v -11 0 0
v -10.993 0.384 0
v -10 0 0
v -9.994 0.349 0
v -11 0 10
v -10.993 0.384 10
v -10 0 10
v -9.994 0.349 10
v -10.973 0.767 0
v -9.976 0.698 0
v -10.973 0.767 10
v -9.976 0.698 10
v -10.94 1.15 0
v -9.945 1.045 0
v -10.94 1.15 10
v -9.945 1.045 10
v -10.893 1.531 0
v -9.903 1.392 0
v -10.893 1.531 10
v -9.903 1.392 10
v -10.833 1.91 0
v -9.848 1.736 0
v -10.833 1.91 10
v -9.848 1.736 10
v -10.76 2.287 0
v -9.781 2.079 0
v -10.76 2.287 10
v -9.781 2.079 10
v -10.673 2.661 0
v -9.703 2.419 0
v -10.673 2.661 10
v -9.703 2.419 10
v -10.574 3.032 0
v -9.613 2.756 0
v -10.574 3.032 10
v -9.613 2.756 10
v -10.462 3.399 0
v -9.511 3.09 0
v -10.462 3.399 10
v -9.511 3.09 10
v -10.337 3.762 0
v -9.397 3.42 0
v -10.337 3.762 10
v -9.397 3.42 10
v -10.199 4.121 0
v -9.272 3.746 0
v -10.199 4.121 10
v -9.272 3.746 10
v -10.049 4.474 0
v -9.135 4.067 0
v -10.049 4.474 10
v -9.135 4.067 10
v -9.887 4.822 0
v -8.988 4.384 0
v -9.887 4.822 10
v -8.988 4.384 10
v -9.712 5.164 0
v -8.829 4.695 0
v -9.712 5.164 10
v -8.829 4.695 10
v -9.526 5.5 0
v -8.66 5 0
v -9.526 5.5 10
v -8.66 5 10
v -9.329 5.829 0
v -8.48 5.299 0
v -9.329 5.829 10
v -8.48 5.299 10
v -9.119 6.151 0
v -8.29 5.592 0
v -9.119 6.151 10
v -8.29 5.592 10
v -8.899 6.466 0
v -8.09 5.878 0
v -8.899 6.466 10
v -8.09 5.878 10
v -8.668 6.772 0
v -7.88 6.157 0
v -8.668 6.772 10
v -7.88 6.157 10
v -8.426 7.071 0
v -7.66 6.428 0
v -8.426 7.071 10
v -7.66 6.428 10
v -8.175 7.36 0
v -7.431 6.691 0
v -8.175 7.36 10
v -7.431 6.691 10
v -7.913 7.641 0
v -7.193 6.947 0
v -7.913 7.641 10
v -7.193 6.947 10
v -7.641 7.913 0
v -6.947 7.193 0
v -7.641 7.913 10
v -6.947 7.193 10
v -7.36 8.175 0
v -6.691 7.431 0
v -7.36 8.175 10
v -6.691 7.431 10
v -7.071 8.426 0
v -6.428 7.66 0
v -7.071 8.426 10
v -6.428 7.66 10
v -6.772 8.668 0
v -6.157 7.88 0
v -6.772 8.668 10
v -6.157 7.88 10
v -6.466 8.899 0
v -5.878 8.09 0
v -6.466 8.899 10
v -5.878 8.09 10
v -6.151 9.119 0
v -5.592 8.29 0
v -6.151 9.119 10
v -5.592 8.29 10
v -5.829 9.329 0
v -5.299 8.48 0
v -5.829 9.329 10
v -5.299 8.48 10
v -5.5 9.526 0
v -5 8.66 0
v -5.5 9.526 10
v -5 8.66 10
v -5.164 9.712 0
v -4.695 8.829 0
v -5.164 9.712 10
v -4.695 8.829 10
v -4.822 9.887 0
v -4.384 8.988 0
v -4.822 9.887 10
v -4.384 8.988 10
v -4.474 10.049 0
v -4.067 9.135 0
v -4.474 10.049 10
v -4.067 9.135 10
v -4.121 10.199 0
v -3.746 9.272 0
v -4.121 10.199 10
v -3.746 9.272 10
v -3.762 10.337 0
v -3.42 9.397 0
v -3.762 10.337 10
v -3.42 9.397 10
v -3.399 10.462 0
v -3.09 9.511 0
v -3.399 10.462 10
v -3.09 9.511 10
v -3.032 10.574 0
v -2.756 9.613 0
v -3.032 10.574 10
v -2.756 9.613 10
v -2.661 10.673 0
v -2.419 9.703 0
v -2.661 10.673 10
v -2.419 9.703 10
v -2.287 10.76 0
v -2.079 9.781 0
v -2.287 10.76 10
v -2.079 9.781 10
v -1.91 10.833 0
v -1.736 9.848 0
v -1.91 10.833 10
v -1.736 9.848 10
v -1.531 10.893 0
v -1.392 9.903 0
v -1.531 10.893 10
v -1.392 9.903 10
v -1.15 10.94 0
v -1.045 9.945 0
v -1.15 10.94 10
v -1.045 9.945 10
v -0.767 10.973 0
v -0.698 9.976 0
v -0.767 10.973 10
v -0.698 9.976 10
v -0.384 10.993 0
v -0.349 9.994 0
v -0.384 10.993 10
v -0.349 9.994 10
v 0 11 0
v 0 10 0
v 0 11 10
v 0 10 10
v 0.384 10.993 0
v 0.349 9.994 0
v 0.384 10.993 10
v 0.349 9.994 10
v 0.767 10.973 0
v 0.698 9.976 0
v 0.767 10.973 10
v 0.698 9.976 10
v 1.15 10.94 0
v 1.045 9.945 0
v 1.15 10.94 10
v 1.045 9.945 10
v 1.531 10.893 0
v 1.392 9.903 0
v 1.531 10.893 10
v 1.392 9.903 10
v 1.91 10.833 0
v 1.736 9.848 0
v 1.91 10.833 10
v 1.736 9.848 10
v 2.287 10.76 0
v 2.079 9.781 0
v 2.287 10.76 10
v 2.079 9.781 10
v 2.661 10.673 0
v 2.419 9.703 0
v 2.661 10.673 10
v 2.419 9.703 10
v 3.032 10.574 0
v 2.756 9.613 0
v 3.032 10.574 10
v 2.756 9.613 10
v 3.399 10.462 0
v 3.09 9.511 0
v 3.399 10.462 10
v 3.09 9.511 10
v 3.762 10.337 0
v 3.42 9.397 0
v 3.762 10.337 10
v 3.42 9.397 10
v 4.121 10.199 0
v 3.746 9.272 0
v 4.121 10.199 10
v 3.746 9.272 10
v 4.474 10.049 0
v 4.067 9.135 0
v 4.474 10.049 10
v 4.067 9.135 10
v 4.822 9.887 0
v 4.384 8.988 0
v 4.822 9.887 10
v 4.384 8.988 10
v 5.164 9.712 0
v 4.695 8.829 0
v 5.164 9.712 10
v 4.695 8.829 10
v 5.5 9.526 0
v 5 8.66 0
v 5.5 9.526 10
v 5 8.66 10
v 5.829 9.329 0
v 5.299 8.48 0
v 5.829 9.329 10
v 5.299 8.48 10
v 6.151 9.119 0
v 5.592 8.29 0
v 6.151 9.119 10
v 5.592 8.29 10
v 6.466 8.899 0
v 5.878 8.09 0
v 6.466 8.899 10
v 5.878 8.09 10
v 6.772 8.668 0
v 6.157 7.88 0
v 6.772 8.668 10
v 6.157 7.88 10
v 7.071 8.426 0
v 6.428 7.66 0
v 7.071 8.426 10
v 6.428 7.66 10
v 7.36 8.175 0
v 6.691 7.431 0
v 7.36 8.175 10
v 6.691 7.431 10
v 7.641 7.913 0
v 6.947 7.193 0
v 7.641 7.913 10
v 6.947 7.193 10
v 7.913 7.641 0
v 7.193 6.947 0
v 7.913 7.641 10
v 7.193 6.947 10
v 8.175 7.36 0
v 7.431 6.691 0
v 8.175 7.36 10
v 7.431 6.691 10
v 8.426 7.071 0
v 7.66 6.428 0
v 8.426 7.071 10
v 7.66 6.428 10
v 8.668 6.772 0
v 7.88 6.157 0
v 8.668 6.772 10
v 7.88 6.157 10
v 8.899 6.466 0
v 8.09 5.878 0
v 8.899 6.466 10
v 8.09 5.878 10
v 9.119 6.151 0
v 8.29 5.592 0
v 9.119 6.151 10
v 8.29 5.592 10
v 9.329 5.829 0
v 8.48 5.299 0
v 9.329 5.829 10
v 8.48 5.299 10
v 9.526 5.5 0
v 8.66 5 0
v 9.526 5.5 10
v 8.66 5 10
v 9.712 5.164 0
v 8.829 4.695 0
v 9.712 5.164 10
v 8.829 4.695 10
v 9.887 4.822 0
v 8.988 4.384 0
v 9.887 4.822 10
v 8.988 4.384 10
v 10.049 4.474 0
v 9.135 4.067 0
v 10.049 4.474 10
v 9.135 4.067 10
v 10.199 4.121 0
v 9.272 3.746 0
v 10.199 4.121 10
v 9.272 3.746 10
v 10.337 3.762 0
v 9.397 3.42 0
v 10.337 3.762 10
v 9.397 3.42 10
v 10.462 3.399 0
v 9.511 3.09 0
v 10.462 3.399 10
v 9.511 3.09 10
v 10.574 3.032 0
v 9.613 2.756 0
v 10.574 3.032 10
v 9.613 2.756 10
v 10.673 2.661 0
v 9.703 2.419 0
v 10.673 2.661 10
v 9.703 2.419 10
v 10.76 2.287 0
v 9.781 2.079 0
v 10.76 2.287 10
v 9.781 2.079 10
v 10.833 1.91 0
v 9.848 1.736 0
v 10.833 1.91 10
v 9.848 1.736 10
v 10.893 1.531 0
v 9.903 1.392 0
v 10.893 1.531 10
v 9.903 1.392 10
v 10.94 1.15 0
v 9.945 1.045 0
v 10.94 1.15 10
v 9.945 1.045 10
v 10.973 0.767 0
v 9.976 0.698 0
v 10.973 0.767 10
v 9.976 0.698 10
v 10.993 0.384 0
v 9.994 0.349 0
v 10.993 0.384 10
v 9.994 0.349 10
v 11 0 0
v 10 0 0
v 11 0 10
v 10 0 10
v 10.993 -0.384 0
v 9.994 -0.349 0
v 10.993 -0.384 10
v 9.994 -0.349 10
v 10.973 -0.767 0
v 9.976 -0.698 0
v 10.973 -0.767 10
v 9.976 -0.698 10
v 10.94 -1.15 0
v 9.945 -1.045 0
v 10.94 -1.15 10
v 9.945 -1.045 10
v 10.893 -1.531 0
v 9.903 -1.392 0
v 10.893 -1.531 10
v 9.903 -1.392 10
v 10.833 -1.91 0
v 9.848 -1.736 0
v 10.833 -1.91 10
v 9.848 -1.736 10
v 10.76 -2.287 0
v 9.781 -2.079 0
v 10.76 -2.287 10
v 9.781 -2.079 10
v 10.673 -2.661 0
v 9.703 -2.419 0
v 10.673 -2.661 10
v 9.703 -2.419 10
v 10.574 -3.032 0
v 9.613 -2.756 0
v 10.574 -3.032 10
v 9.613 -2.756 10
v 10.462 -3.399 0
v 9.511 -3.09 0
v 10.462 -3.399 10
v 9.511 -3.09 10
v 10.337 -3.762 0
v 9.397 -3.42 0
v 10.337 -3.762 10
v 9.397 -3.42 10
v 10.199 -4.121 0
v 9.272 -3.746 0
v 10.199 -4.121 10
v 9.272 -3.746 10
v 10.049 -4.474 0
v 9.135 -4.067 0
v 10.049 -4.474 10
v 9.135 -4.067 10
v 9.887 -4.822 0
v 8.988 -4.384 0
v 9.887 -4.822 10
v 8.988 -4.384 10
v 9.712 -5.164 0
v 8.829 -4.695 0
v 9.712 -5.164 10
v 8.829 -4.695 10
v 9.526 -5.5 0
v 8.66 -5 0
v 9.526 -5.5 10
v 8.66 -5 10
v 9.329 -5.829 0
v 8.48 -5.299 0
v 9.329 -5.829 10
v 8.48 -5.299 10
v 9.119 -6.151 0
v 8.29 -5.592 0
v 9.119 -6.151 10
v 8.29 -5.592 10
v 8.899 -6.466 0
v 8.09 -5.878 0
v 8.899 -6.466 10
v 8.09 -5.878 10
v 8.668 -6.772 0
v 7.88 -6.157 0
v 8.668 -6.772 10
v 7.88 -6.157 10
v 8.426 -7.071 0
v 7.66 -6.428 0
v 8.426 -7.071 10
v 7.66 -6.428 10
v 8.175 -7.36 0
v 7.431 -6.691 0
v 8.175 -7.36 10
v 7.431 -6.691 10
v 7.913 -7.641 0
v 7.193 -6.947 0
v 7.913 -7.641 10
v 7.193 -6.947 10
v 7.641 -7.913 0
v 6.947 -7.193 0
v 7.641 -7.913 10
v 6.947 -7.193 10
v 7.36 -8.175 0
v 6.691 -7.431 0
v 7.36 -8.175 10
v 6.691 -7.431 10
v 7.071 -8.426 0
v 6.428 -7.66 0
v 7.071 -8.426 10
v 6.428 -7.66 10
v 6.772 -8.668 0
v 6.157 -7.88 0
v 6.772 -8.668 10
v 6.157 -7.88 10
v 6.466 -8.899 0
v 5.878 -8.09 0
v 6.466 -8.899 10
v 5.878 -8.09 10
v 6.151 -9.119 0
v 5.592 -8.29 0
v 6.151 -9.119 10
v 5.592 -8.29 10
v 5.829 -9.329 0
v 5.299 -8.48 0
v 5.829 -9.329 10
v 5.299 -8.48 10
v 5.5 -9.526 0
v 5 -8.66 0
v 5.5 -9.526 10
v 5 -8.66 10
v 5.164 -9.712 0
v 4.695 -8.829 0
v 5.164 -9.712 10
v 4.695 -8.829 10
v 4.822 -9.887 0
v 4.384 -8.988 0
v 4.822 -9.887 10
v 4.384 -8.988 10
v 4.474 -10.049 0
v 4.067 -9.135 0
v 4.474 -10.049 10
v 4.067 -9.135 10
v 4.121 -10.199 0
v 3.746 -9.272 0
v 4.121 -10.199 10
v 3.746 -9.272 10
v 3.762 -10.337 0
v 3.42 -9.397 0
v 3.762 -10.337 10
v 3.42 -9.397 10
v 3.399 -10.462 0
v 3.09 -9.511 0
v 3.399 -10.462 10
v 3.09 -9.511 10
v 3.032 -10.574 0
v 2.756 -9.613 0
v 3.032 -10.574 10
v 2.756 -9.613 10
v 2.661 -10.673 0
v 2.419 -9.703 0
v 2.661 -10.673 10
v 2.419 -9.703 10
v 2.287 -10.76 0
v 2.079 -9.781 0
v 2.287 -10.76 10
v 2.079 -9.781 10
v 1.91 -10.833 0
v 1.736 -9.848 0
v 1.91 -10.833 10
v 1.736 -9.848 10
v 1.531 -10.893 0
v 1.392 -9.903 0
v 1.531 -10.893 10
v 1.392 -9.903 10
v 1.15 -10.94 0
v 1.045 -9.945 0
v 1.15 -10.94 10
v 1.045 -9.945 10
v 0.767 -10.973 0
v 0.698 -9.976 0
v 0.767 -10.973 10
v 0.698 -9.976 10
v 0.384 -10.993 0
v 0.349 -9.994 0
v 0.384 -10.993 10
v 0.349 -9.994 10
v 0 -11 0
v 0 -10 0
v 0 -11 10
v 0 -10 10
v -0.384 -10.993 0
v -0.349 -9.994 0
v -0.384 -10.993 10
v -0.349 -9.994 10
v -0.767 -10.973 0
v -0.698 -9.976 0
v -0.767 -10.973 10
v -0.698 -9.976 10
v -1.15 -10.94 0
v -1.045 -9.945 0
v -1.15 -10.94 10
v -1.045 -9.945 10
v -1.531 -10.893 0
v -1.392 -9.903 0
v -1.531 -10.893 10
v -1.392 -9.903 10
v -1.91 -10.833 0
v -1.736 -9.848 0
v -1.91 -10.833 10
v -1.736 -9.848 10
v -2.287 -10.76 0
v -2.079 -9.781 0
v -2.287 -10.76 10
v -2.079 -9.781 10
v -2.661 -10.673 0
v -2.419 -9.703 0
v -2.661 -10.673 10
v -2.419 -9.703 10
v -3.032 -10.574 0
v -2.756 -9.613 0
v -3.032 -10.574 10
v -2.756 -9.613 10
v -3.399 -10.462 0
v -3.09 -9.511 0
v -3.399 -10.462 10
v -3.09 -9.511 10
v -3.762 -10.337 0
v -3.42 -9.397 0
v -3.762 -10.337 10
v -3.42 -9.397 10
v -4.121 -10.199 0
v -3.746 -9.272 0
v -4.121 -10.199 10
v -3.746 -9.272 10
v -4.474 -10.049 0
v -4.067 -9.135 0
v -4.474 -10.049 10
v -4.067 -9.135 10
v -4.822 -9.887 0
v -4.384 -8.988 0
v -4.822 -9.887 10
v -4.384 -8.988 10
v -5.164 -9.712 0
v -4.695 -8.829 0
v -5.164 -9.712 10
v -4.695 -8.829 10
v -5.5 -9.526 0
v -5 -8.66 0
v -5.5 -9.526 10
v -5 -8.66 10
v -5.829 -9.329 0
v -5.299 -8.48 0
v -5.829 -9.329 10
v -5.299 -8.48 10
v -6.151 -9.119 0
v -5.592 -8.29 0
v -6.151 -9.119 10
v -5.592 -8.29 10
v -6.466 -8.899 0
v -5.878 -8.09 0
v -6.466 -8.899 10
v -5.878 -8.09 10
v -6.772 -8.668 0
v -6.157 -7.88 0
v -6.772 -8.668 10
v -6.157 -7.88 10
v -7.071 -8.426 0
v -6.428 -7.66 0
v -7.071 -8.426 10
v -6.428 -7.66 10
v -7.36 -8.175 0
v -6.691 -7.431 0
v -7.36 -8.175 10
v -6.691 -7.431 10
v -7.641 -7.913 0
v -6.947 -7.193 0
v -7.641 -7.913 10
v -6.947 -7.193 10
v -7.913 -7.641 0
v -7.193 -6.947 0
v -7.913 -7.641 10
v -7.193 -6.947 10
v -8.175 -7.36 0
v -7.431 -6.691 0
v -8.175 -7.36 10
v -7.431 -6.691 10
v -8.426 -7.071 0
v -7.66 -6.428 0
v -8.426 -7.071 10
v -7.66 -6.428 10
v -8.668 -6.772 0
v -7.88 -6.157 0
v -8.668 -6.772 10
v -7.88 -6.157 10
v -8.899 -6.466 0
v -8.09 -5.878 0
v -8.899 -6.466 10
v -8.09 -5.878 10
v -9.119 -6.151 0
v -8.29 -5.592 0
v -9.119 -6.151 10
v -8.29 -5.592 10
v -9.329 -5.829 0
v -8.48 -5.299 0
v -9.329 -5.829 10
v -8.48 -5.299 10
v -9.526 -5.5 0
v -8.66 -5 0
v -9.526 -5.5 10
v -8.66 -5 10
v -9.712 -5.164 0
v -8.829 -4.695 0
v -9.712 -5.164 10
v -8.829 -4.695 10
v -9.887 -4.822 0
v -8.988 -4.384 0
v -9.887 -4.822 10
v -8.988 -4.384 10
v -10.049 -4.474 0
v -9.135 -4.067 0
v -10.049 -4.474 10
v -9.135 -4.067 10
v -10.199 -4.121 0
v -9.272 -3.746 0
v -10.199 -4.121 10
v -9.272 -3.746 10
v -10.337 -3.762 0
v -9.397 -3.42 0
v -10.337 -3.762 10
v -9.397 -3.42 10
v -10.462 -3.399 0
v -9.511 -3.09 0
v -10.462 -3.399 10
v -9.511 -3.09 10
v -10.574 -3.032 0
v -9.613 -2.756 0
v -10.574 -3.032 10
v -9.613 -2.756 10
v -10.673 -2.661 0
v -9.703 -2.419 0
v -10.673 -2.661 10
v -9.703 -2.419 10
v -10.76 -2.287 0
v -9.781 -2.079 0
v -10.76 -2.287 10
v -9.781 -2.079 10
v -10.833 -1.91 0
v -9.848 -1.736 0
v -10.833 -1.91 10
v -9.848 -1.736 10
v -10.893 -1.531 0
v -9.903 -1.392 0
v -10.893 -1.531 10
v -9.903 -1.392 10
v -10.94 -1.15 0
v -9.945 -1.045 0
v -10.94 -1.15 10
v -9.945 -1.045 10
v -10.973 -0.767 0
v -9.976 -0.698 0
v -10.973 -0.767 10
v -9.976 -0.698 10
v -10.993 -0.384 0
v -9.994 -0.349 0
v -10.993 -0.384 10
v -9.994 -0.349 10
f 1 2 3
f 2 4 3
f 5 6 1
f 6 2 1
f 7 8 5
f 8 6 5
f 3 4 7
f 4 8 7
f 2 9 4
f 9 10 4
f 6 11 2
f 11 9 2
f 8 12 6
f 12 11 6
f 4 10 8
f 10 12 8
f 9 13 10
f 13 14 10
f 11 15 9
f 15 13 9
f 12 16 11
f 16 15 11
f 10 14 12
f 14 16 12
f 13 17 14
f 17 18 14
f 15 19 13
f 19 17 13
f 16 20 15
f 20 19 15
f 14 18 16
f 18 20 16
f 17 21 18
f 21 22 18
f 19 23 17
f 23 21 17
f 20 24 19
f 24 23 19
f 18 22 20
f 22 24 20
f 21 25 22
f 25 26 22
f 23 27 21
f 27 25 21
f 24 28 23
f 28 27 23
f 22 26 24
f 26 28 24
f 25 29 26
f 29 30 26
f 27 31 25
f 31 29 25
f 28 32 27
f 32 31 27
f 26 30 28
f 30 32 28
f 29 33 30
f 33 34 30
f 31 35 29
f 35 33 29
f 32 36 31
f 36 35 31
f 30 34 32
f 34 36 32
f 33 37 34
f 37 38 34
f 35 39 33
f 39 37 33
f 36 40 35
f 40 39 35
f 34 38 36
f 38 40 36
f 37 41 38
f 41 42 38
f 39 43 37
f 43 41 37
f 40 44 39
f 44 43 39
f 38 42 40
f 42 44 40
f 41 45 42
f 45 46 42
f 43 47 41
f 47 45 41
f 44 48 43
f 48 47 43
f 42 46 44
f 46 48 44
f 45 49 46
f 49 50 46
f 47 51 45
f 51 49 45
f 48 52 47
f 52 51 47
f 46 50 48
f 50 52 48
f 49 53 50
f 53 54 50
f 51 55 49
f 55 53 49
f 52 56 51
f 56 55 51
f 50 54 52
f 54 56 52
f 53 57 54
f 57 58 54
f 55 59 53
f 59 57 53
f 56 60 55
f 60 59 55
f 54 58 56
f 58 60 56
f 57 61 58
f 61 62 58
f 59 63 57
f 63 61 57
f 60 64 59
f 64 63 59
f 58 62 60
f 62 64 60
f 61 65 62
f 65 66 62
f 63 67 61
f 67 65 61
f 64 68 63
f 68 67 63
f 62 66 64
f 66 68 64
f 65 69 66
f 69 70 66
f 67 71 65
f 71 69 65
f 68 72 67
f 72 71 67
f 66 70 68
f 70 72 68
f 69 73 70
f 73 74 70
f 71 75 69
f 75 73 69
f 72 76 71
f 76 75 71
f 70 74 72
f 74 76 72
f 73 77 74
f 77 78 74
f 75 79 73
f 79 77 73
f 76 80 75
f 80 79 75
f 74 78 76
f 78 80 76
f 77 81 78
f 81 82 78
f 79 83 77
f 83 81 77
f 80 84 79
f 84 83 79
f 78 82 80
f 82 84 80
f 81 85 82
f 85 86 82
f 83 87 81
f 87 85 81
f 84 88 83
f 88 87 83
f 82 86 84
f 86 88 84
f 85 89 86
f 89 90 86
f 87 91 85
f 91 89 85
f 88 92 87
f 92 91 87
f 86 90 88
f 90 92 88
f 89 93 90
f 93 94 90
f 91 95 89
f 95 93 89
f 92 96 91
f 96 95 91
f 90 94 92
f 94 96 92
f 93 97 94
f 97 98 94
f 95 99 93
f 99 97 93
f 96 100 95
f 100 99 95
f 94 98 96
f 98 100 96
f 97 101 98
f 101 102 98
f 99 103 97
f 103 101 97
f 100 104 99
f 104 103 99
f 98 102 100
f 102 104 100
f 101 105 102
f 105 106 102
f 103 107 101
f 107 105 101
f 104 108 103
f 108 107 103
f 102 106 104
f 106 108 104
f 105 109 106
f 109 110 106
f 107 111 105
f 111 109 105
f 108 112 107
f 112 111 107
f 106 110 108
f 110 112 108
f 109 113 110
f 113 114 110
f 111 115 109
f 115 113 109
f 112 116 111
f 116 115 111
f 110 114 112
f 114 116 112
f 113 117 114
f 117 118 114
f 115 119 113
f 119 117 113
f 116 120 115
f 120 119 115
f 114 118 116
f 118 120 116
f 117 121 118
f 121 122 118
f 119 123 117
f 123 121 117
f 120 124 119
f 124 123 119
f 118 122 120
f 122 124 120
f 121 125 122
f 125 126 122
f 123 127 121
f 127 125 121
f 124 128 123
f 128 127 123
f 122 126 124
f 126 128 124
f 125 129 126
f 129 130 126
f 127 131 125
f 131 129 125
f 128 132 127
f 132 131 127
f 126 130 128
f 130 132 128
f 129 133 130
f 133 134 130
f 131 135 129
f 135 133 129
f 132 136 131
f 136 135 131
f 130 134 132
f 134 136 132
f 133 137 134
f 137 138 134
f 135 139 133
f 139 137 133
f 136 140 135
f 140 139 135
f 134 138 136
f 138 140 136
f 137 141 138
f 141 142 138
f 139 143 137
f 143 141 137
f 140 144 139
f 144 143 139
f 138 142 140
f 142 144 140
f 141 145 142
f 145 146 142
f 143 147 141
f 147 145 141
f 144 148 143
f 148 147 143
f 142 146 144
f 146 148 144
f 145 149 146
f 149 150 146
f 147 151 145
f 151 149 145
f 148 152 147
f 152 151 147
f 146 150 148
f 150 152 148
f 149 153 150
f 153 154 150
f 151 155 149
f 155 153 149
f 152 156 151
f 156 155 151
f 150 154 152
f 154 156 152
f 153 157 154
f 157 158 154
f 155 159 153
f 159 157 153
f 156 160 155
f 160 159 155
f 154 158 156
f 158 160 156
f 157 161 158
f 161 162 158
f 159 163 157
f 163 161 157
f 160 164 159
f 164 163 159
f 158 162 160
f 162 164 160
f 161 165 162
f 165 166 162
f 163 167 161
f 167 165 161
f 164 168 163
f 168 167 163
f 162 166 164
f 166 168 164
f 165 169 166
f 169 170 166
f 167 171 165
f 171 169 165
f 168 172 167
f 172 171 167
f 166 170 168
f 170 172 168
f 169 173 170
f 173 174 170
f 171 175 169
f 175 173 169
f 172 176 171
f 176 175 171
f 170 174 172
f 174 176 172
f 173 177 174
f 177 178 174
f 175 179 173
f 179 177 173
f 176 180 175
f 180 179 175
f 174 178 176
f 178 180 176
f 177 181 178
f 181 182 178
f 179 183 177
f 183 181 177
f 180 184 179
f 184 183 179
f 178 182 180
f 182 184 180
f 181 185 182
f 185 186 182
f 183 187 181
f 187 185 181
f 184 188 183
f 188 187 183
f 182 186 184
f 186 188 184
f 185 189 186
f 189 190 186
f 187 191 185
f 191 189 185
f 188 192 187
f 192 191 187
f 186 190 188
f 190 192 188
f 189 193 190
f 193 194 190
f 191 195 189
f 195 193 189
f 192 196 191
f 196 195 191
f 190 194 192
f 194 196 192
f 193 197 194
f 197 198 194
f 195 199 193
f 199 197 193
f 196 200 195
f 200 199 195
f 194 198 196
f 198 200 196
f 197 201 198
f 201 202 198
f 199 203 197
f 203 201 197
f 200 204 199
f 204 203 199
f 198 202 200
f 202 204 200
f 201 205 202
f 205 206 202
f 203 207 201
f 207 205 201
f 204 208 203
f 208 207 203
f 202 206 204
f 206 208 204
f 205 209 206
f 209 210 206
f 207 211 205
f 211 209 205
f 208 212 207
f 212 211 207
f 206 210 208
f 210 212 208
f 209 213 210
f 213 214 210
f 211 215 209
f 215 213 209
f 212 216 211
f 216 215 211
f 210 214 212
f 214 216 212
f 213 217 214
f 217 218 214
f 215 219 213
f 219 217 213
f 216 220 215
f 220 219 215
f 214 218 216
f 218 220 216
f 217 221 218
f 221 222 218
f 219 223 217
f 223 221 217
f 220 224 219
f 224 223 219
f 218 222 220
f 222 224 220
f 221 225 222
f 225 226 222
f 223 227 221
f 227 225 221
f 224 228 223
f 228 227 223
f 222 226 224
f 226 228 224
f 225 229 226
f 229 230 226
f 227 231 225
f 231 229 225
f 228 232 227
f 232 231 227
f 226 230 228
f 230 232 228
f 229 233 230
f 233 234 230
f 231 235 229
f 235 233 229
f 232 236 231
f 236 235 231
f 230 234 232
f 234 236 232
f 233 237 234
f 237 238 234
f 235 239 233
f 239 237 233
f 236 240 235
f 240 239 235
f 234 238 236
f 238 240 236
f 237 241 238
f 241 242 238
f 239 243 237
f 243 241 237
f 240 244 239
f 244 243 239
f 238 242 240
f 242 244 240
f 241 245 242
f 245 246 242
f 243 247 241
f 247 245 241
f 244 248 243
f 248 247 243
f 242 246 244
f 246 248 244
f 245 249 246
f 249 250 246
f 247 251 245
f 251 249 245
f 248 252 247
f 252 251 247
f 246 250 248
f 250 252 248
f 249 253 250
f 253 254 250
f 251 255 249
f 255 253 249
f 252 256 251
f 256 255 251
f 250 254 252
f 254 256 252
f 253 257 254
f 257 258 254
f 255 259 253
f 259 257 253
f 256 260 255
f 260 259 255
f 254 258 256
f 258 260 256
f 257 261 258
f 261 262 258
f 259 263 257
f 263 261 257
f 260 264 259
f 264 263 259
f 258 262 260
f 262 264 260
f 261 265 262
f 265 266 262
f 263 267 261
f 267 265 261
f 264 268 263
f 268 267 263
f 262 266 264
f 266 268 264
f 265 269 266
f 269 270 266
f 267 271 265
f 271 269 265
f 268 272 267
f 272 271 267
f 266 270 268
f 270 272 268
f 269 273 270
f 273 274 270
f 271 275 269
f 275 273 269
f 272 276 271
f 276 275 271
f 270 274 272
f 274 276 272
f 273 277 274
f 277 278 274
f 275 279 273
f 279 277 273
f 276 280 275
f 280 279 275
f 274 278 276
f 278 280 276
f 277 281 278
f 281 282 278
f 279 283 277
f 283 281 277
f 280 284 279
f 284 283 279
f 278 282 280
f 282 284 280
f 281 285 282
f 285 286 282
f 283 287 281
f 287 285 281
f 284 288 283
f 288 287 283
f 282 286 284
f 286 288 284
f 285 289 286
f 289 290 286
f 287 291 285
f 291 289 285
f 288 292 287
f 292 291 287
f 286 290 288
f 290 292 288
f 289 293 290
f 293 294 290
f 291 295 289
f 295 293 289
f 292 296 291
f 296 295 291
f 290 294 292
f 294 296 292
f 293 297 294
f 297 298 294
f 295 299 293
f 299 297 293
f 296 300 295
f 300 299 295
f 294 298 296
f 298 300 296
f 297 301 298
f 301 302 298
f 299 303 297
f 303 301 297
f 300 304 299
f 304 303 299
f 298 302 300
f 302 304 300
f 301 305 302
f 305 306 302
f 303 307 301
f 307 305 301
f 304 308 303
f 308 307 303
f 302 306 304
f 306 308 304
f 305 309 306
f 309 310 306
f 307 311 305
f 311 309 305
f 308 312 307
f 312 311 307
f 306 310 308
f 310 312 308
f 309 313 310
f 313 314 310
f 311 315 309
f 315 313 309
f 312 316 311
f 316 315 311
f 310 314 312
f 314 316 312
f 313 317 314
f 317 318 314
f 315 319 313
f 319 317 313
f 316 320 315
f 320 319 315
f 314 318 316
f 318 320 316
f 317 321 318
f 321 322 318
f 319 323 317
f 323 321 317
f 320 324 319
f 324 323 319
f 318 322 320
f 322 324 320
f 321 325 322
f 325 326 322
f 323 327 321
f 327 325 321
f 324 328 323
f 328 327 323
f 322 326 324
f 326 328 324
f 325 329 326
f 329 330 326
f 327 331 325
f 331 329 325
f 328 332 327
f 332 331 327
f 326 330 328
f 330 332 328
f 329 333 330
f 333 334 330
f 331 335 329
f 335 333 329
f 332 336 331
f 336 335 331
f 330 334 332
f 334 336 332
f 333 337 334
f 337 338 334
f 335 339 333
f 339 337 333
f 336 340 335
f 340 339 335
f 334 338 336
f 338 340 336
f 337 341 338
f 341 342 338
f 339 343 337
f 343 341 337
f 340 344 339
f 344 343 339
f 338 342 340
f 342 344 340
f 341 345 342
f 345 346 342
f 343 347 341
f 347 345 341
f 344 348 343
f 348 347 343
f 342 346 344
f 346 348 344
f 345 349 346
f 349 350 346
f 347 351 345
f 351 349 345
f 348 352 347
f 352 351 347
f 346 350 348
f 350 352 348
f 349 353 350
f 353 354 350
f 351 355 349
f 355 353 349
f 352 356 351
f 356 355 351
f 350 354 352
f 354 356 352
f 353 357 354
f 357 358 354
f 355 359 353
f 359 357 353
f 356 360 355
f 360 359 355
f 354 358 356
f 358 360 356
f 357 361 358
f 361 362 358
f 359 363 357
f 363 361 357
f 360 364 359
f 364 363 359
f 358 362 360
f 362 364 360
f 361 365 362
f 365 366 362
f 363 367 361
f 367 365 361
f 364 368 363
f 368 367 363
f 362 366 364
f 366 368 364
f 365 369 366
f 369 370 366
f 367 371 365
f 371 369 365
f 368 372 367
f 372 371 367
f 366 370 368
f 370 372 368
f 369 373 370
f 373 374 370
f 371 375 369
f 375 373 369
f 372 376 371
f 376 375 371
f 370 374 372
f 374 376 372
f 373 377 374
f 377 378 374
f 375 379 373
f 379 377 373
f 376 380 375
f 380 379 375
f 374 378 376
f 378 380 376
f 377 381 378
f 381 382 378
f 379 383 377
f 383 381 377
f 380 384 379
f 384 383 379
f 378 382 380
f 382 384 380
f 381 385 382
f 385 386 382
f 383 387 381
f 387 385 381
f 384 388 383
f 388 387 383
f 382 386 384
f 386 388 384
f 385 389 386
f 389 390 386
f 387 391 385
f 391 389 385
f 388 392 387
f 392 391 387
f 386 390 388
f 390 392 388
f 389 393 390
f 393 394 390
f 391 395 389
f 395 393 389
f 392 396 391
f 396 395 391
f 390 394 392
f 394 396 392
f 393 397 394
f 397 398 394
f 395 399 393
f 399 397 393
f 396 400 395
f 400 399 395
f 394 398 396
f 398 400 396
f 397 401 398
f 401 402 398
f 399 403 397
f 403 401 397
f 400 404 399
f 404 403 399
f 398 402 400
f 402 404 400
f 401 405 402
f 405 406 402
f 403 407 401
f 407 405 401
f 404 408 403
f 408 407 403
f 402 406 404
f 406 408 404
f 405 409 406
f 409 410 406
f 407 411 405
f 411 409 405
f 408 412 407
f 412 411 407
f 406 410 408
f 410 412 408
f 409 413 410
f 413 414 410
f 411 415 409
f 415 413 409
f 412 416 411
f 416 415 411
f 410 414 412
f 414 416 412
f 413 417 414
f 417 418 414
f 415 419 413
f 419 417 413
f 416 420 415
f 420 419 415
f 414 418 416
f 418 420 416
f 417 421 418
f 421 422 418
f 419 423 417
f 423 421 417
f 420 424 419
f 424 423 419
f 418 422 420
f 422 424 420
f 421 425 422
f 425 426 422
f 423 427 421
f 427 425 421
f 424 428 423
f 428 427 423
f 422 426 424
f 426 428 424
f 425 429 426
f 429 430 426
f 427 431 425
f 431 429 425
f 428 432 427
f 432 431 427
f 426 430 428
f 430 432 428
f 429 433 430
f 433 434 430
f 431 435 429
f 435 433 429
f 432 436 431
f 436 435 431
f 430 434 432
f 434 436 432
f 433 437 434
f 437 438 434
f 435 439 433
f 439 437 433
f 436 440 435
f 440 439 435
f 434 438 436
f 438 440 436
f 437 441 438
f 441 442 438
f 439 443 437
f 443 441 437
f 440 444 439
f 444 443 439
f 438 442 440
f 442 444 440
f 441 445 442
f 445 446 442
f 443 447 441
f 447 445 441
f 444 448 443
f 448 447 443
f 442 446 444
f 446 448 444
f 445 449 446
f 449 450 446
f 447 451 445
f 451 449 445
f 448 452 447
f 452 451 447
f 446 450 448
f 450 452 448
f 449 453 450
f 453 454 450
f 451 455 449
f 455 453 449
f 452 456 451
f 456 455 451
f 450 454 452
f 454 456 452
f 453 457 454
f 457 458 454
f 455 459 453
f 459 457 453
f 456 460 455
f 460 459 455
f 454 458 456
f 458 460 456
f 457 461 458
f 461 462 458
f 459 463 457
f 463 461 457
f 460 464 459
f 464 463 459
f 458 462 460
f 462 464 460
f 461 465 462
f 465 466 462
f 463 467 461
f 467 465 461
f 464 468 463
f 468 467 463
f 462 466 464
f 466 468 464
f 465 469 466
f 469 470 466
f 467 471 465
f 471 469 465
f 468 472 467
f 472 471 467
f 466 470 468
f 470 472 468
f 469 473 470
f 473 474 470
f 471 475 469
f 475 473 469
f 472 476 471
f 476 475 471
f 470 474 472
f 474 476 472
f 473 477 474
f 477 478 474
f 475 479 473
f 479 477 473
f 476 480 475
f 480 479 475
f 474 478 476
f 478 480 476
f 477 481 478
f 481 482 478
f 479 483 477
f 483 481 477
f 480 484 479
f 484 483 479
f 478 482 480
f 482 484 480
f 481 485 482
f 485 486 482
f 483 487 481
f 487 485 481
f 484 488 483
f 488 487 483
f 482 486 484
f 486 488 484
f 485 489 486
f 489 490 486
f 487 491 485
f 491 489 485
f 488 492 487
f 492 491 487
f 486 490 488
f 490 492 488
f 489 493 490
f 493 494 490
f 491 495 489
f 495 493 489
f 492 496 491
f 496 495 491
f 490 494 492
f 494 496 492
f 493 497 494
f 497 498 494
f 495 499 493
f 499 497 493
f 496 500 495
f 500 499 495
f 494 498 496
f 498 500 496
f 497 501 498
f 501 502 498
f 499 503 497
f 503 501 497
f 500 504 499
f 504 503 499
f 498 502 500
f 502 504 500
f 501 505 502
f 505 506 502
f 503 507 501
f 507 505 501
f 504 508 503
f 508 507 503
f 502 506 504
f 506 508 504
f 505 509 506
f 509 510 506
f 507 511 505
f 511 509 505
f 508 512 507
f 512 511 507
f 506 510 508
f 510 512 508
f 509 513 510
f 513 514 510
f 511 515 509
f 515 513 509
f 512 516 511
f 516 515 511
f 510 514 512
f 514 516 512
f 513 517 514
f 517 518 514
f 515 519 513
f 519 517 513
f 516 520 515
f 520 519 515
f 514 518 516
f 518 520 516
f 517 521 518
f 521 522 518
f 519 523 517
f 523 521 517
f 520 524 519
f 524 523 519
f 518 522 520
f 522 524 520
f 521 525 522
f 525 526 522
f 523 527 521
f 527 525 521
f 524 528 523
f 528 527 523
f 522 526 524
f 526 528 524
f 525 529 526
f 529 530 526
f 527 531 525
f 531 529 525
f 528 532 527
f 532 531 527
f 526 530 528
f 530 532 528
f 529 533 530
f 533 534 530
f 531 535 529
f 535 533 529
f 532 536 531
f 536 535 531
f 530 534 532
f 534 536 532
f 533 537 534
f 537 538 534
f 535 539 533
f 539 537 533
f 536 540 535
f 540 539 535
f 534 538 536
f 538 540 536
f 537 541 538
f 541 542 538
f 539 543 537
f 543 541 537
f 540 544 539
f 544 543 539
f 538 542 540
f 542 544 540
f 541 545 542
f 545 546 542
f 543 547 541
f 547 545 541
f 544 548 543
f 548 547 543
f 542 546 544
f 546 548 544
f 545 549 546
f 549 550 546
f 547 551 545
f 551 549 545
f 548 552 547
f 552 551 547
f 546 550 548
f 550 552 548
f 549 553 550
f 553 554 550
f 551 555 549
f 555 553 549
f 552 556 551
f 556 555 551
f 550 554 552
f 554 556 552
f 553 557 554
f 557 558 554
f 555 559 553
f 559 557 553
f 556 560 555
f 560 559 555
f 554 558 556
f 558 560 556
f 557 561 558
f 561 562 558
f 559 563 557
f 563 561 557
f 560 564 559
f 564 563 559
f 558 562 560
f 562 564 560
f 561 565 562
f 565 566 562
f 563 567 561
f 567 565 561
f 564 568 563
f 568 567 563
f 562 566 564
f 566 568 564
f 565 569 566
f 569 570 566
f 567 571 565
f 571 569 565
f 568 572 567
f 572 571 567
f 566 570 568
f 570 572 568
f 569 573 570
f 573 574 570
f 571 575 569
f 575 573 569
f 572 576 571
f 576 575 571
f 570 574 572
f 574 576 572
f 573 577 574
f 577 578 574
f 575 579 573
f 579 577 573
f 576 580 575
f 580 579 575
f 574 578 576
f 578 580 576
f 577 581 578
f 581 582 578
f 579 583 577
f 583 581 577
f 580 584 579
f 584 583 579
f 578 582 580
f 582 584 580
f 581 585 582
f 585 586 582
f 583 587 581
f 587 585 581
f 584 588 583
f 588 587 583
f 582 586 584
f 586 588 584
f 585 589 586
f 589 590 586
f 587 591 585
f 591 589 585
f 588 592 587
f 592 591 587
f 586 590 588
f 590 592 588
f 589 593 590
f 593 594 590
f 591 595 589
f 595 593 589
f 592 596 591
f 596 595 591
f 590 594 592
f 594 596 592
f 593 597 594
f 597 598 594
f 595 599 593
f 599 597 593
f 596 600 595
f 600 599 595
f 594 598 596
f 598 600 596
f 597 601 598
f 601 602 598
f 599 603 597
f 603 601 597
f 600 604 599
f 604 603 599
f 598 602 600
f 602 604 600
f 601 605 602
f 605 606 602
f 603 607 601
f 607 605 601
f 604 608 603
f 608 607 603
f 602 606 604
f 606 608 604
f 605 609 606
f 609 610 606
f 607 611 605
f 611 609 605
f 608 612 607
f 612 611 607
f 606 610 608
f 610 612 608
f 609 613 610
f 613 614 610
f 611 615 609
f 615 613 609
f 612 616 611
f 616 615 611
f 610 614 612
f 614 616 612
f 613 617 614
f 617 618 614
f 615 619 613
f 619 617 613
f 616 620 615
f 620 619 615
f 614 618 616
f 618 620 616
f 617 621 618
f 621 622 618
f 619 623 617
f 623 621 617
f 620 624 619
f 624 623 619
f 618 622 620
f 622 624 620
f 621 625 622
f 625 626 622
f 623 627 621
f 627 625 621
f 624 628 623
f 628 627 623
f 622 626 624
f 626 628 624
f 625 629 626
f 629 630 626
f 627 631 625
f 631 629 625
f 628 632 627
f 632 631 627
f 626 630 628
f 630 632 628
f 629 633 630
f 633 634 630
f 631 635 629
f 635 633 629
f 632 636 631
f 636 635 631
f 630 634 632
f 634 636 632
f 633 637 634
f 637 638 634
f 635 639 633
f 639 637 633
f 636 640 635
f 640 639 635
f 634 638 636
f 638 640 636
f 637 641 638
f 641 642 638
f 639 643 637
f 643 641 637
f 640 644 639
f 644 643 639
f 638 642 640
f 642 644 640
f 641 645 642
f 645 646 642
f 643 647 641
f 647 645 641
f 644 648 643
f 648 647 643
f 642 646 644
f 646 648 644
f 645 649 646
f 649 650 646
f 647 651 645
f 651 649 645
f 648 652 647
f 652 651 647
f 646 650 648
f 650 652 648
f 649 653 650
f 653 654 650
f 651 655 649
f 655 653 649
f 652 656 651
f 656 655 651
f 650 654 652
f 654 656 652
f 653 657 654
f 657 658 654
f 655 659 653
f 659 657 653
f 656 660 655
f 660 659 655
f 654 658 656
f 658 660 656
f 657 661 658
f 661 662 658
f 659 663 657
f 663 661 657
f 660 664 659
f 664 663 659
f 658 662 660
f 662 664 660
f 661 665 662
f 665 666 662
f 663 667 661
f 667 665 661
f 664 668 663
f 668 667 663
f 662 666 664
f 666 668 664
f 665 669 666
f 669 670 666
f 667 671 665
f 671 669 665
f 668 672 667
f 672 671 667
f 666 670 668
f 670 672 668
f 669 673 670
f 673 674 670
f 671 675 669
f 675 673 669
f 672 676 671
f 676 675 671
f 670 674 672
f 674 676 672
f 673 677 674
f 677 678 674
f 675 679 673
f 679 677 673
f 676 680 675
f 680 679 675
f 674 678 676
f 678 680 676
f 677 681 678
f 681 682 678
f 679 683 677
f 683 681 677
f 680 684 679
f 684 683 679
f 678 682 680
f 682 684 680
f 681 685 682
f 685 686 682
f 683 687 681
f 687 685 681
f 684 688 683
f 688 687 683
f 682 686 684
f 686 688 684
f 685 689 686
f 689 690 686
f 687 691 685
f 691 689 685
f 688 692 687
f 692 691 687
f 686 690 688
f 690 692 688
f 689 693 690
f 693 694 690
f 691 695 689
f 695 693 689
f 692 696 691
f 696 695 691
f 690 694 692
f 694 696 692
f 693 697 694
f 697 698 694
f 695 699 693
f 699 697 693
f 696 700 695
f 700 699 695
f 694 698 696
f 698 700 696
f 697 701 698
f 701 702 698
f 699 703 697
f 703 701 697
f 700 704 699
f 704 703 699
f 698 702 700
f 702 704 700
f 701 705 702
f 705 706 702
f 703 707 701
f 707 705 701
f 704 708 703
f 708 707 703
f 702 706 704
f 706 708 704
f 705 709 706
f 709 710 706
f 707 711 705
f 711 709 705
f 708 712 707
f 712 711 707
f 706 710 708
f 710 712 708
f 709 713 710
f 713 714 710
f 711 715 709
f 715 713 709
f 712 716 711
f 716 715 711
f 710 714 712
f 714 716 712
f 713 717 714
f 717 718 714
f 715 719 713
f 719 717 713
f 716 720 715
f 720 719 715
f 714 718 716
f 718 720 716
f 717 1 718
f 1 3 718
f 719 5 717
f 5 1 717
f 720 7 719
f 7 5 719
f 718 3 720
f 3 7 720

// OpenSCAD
$fn=180;
rotate_extrude()
    translate([10,0,0]) square([1,10]);
